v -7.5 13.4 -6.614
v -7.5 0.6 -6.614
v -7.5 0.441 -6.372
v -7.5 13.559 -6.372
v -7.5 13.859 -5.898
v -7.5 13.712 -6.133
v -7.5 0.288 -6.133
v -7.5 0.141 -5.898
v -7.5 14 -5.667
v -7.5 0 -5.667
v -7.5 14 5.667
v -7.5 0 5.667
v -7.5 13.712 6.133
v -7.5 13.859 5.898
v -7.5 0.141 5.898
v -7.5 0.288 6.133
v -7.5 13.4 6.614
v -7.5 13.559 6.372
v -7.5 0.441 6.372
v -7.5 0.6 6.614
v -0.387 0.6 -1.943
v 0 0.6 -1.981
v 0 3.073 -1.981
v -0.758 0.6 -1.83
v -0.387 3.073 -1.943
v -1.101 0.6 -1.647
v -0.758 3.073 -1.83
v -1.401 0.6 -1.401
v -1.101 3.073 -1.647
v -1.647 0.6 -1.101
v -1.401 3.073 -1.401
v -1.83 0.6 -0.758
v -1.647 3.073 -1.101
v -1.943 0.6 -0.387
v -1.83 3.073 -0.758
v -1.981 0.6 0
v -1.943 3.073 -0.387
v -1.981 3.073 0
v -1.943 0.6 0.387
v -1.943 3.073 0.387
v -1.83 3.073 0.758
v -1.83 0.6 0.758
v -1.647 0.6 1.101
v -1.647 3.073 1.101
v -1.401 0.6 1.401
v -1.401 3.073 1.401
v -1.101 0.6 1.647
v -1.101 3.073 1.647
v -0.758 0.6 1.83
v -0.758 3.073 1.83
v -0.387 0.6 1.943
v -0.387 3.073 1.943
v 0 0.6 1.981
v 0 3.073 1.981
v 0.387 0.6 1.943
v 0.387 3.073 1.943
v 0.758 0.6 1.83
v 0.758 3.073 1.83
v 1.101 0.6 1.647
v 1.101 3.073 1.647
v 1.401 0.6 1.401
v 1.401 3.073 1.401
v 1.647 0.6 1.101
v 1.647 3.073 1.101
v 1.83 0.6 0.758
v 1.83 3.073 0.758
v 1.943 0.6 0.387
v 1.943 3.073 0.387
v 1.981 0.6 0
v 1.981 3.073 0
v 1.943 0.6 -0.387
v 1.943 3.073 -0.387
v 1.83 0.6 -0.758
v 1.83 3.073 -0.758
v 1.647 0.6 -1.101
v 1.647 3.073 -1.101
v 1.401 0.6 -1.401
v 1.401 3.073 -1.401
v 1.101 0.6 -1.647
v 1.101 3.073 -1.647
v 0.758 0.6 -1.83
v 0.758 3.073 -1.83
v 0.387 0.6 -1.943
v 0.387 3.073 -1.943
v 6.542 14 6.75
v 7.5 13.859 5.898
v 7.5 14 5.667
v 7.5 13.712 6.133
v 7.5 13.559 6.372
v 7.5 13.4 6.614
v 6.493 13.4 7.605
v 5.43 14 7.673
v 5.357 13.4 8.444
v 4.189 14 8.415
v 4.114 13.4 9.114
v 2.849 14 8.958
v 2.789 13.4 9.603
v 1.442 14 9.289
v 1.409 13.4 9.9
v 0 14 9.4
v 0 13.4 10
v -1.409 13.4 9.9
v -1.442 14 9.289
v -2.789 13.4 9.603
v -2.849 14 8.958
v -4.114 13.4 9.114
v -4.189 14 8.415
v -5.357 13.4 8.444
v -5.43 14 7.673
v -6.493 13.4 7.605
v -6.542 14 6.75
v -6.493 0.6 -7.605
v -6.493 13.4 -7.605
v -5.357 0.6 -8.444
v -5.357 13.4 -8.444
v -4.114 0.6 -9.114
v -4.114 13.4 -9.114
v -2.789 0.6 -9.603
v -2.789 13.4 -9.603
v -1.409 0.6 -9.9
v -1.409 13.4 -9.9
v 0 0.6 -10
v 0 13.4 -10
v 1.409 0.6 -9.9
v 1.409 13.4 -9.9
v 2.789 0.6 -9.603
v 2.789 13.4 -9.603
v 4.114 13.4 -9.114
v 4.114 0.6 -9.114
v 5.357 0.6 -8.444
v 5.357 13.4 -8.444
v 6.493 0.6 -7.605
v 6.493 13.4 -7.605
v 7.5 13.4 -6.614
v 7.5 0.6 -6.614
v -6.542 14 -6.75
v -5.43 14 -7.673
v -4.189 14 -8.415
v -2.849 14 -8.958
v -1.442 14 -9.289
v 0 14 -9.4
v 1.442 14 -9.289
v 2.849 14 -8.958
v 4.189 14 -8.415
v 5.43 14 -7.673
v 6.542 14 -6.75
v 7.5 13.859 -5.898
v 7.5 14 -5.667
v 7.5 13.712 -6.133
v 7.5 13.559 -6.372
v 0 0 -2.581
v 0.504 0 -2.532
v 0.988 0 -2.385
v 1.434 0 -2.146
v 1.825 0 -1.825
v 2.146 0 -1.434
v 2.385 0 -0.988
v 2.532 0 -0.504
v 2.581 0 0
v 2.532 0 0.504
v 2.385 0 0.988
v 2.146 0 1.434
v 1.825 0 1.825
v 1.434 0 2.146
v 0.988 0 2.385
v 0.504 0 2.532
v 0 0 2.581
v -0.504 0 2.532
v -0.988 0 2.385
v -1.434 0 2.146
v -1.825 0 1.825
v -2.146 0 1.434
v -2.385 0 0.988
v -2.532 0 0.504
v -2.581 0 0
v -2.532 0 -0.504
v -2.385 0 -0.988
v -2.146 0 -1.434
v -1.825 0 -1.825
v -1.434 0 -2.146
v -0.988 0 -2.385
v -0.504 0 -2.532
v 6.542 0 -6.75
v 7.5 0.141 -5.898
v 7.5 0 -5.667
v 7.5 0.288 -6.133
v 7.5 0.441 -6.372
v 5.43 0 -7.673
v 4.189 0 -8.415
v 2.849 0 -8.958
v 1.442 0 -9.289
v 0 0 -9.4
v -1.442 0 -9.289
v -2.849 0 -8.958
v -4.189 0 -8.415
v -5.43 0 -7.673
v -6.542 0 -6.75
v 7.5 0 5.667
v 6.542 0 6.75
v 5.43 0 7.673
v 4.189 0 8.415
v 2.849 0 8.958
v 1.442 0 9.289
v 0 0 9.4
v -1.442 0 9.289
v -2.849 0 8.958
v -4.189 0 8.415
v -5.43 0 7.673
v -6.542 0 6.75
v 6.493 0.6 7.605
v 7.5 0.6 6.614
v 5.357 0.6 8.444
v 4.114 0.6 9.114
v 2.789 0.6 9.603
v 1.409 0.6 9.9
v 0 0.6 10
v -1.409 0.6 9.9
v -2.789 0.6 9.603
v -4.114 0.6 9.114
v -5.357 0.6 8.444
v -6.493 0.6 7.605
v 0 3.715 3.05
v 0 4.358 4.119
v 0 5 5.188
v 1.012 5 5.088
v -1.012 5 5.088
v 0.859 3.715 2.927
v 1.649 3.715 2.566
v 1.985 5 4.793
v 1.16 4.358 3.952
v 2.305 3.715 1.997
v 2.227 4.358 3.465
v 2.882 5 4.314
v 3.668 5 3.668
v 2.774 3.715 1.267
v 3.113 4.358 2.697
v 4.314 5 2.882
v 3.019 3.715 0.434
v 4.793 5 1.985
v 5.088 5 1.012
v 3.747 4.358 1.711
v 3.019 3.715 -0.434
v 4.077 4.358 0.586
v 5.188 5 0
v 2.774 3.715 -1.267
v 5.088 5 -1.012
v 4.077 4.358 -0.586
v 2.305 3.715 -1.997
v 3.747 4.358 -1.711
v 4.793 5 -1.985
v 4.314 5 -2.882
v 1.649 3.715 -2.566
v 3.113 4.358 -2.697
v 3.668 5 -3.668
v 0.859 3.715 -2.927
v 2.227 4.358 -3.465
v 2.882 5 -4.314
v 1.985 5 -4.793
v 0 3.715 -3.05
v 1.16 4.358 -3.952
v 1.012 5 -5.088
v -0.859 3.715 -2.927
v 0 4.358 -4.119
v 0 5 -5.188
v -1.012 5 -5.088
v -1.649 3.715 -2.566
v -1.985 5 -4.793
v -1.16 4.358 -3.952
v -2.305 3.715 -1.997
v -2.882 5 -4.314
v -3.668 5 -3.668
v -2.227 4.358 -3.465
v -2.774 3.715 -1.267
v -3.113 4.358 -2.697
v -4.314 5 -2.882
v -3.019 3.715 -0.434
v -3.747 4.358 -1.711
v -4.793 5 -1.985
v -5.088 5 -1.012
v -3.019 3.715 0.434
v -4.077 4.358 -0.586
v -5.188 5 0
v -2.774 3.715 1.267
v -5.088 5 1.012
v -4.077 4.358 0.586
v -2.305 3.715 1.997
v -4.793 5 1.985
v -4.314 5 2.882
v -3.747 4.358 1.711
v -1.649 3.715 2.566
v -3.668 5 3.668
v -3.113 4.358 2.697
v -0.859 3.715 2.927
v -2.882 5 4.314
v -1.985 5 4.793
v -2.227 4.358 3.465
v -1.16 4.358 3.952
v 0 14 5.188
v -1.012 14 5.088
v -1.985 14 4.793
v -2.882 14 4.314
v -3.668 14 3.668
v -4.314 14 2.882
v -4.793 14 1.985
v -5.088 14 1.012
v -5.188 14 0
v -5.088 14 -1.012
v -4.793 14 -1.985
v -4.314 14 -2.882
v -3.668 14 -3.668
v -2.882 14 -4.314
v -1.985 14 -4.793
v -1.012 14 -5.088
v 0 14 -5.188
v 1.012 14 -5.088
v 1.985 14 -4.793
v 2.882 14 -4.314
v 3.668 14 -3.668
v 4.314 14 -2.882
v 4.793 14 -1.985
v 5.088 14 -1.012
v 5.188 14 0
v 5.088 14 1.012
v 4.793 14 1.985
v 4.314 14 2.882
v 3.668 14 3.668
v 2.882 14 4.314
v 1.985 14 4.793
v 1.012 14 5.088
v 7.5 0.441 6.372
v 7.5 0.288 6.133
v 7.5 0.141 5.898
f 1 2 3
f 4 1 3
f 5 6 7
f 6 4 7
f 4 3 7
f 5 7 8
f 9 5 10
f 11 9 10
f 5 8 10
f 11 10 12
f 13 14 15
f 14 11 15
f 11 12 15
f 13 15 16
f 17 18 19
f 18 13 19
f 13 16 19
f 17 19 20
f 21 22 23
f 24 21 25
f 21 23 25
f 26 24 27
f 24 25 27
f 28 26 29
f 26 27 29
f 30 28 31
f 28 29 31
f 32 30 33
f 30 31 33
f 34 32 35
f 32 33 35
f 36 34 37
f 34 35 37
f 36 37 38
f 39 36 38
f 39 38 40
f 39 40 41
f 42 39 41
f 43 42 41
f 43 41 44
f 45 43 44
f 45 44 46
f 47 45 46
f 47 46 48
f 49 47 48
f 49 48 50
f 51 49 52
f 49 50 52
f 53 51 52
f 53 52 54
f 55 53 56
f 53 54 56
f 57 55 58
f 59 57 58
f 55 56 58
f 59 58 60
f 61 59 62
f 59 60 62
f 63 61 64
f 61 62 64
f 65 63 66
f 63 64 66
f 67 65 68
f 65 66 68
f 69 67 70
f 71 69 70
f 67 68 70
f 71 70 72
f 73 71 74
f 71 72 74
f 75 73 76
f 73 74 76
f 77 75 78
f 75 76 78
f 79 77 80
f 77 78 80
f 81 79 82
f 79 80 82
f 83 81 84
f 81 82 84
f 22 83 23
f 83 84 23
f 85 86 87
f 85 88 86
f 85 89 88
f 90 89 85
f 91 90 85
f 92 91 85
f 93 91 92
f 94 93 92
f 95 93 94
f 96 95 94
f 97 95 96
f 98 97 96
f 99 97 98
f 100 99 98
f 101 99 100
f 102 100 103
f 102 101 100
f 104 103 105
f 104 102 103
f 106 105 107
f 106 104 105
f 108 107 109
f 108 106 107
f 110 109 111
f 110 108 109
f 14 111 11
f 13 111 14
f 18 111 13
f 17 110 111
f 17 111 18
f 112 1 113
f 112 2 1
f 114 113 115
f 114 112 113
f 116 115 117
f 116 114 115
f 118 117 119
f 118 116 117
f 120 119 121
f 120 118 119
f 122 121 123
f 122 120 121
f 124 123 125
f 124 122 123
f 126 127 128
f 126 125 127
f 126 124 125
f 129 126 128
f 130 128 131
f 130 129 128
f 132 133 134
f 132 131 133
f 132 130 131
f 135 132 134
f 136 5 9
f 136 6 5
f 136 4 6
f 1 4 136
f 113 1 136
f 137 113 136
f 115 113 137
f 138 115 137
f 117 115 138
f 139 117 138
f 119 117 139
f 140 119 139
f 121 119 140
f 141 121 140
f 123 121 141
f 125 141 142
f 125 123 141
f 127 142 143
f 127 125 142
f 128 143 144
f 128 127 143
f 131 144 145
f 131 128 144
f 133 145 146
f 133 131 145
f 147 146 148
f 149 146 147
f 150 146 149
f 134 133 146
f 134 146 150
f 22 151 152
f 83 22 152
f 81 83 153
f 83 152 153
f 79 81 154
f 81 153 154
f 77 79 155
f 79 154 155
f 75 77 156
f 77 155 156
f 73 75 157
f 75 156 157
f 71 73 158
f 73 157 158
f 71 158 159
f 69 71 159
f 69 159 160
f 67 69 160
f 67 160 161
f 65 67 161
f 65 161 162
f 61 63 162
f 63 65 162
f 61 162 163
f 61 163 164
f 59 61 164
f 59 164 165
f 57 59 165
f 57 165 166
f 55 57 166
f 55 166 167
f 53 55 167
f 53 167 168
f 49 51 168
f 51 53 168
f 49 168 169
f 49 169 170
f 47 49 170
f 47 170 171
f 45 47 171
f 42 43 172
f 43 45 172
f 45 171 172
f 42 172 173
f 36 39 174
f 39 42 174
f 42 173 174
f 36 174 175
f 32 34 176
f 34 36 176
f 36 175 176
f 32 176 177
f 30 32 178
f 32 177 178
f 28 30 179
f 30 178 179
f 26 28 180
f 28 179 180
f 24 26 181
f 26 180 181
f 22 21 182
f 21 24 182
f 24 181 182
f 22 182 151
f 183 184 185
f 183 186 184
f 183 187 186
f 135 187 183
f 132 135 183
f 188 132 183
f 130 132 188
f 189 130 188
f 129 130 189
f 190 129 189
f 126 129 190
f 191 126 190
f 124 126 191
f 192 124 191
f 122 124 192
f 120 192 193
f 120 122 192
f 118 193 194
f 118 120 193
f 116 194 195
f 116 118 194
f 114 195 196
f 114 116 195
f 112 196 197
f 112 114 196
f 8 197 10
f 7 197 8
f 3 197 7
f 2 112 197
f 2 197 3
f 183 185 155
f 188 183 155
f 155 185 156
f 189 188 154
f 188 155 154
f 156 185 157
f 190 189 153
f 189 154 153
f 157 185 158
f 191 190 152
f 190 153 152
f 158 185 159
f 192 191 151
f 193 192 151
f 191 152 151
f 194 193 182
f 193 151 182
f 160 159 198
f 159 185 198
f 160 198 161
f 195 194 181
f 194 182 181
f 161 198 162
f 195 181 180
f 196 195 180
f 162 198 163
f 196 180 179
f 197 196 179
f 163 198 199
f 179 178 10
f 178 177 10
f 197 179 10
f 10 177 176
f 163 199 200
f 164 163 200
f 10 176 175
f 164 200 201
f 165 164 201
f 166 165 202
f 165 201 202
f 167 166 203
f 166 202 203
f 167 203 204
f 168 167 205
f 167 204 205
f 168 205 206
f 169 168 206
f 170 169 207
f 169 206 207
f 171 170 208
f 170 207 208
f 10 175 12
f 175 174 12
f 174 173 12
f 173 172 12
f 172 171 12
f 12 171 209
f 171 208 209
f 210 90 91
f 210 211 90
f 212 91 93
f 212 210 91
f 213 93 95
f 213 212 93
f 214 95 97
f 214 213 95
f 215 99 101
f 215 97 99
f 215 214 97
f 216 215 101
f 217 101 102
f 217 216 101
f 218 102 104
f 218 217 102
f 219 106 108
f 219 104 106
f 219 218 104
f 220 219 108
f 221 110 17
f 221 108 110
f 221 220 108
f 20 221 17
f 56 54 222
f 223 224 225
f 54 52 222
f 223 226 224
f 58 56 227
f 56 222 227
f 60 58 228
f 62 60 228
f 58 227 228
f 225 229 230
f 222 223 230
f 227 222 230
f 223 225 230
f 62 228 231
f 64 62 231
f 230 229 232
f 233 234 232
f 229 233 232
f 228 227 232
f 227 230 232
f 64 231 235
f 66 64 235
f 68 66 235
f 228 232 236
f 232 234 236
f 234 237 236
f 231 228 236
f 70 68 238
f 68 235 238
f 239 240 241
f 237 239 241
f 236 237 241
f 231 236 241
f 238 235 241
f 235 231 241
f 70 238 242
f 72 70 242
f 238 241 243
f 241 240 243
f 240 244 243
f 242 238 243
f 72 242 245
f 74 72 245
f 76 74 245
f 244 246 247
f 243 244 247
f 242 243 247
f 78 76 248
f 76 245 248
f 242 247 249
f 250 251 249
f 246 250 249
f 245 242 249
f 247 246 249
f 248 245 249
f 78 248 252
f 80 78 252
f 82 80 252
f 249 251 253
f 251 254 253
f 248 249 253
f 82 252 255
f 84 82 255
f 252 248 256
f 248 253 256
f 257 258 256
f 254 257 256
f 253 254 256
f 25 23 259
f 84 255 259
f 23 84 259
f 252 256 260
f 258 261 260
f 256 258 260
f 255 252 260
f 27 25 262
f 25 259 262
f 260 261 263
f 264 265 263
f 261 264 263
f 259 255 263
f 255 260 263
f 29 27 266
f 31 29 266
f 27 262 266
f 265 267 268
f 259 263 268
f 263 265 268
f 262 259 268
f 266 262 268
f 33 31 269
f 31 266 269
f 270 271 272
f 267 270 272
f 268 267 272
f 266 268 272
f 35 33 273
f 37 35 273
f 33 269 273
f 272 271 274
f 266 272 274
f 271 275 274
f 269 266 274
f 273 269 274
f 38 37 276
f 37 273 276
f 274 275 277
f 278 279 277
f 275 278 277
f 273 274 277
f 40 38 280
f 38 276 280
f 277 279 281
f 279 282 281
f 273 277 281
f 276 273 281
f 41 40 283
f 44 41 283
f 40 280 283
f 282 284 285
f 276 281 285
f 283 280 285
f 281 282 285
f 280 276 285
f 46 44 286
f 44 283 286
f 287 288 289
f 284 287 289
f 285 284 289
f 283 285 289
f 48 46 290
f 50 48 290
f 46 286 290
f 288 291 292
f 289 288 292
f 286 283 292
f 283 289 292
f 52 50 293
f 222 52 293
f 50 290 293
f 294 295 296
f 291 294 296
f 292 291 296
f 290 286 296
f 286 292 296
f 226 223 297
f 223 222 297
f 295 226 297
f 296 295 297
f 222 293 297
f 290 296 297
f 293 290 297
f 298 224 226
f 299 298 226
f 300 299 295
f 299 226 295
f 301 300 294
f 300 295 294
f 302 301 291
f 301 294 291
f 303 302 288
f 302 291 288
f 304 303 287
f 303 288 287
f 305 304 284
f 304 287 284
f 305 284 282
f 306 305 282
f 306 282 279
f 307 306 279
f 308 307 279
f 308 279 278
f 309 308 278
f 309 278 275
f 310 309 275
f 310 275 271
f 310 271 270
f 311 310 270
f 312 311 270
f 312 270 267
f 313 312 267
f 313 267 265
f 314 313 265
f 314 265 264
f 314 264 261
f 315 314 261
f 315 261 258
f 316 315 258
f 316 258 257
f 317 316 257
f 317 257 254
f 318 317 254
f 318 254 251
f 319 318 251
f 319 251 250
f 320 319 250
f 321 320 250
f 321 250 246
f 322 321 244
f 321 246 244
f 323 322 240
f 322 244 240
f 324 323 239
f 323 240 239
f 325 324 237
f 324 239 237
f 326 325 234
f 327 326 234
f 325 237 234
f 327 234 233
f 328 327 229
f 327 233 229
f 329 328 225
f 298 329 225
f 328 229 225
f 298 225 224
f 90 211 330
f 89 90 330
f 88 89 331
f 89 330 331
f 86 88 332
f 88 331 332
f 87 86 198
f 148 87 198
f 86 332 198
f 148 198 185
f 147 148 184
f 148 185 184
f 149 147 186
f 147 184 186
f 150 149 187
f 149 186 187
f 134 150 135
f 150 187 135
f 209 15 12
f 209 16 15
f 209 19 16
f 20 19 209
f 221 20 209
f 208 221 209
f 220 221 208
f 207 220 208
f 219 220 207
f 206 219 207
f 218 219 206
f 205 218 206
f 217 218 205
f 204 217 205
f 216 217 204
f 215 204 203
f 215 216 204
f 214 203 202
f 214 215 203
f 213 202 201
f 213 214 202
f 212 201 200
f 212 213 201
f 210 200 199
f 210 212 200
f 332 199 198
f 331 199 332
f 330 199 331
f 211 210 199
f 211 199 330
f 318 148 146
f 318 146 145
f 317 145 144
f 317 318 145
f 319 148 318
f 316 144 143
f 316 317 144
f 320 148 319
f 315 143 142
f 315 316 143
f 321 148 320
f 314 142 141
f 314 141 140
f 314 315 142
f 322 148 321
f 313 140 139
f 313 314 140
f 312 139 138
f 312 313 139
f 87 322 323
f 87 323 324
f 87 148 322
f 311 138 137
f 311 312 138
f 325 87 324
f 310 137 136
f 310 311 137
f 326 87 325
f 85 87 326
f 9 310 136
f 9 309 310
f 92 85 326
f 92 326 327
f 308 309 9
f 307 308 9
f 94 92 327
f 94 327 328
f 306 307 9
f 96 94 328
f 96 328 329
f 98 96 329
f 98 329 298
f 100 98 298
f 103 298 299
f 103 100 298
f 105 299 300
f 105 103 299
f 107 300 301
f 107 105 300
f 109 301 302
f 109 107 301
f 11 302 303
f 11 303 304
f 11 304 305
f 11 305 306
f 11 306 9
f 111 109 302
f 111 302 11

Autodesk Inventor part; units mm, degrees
ref_plane "YZ Plane" through (0, 0, 0) normal (1, 0, 0) x (0, 1, 0)
ref_plane "XZ Plane" through (0, 0, 0) normal (0, 1, 0) x (-1, 0, 0)
ref_plane "XY Plane" through (0, 0, 0) normal (0, 0, 1) x (1, 0, 0)
sketch "Sketch1" plane through (0, 0, 0) normal (0, 1, 0) x (-1, 0, 0)
  circle A0 centre (0, 0) radius 10
  dimension "d0" = 20
extrude "Extrusion1" add sketch "Sketch1" along normal blind 14
sketch "Sketch2" plane through (0, 14, 0) normal (0, 1, 0) x (1, 0, 0)
  point P0 (0, 0)
  point P1 (0, 0)
hole "Hole1" at (0, 14, 0) direction (0, -1, 0) diameter 10.376 depth 9 tip angle 118 thread size "M12x1.5" class "6H" standard "ISO Metric profile"
sketch "Sketch3" plane through (0, 0, 0) normal (0, -1, 0) x (1, 0, 0)
  point P0 (0, 0)
  point P1 (0, 0)
hole "Hole2" at (0, 0, 0) direction (0, 1, 0) diameter 3.9624 end through all thread size "10-32 UNF" class "2B" standard "ANSI Unified Screw Threads"
chamfer "Chamfer1" distance 0.6 angle 45 3 edges at (0, 0, 1.9812) (10, 14, 0) (10, 0, 0)
sketch "Sketch4" plane through (0, 0, 0) normal (0, -1, 0) x (1, 0, 0)
  circle A0 centre (0, 0) radius 5.188 projected
  circle A1 centre (0, 0) radius 10 projected
  line L0 (-7.5, 6.6144) -> (7.5, 6.6144)
  line L1 (7.5, 6.6144) -> (7.5, -6.6144)
  line L2 (7.5, -6.6144) -> (-7.5, -6.6144)
  line L3 (-7.5, -6.6144) -> (-7.5, 6.6144)
  circle A2 centre (0, 0) radius 2.5812 projected
  line L4 (-7.5, 6.6144) -> (7.5, -6.6144) construction
  line L5 (7.5, 6.6144) -> (-7.5, -6.6144) construction
  point P0 (-7.5, -6.6144)
  point P1 (-7.5, 6.6144)
  point P2 (7.5, 6.6144)
  dimension "d20" = 15
extrude "Extrusion2" cut sketch "Sketch4" against normal blind 14 contours A1 L1 | L3 A1
properties part number "Port Conversion Nut"
